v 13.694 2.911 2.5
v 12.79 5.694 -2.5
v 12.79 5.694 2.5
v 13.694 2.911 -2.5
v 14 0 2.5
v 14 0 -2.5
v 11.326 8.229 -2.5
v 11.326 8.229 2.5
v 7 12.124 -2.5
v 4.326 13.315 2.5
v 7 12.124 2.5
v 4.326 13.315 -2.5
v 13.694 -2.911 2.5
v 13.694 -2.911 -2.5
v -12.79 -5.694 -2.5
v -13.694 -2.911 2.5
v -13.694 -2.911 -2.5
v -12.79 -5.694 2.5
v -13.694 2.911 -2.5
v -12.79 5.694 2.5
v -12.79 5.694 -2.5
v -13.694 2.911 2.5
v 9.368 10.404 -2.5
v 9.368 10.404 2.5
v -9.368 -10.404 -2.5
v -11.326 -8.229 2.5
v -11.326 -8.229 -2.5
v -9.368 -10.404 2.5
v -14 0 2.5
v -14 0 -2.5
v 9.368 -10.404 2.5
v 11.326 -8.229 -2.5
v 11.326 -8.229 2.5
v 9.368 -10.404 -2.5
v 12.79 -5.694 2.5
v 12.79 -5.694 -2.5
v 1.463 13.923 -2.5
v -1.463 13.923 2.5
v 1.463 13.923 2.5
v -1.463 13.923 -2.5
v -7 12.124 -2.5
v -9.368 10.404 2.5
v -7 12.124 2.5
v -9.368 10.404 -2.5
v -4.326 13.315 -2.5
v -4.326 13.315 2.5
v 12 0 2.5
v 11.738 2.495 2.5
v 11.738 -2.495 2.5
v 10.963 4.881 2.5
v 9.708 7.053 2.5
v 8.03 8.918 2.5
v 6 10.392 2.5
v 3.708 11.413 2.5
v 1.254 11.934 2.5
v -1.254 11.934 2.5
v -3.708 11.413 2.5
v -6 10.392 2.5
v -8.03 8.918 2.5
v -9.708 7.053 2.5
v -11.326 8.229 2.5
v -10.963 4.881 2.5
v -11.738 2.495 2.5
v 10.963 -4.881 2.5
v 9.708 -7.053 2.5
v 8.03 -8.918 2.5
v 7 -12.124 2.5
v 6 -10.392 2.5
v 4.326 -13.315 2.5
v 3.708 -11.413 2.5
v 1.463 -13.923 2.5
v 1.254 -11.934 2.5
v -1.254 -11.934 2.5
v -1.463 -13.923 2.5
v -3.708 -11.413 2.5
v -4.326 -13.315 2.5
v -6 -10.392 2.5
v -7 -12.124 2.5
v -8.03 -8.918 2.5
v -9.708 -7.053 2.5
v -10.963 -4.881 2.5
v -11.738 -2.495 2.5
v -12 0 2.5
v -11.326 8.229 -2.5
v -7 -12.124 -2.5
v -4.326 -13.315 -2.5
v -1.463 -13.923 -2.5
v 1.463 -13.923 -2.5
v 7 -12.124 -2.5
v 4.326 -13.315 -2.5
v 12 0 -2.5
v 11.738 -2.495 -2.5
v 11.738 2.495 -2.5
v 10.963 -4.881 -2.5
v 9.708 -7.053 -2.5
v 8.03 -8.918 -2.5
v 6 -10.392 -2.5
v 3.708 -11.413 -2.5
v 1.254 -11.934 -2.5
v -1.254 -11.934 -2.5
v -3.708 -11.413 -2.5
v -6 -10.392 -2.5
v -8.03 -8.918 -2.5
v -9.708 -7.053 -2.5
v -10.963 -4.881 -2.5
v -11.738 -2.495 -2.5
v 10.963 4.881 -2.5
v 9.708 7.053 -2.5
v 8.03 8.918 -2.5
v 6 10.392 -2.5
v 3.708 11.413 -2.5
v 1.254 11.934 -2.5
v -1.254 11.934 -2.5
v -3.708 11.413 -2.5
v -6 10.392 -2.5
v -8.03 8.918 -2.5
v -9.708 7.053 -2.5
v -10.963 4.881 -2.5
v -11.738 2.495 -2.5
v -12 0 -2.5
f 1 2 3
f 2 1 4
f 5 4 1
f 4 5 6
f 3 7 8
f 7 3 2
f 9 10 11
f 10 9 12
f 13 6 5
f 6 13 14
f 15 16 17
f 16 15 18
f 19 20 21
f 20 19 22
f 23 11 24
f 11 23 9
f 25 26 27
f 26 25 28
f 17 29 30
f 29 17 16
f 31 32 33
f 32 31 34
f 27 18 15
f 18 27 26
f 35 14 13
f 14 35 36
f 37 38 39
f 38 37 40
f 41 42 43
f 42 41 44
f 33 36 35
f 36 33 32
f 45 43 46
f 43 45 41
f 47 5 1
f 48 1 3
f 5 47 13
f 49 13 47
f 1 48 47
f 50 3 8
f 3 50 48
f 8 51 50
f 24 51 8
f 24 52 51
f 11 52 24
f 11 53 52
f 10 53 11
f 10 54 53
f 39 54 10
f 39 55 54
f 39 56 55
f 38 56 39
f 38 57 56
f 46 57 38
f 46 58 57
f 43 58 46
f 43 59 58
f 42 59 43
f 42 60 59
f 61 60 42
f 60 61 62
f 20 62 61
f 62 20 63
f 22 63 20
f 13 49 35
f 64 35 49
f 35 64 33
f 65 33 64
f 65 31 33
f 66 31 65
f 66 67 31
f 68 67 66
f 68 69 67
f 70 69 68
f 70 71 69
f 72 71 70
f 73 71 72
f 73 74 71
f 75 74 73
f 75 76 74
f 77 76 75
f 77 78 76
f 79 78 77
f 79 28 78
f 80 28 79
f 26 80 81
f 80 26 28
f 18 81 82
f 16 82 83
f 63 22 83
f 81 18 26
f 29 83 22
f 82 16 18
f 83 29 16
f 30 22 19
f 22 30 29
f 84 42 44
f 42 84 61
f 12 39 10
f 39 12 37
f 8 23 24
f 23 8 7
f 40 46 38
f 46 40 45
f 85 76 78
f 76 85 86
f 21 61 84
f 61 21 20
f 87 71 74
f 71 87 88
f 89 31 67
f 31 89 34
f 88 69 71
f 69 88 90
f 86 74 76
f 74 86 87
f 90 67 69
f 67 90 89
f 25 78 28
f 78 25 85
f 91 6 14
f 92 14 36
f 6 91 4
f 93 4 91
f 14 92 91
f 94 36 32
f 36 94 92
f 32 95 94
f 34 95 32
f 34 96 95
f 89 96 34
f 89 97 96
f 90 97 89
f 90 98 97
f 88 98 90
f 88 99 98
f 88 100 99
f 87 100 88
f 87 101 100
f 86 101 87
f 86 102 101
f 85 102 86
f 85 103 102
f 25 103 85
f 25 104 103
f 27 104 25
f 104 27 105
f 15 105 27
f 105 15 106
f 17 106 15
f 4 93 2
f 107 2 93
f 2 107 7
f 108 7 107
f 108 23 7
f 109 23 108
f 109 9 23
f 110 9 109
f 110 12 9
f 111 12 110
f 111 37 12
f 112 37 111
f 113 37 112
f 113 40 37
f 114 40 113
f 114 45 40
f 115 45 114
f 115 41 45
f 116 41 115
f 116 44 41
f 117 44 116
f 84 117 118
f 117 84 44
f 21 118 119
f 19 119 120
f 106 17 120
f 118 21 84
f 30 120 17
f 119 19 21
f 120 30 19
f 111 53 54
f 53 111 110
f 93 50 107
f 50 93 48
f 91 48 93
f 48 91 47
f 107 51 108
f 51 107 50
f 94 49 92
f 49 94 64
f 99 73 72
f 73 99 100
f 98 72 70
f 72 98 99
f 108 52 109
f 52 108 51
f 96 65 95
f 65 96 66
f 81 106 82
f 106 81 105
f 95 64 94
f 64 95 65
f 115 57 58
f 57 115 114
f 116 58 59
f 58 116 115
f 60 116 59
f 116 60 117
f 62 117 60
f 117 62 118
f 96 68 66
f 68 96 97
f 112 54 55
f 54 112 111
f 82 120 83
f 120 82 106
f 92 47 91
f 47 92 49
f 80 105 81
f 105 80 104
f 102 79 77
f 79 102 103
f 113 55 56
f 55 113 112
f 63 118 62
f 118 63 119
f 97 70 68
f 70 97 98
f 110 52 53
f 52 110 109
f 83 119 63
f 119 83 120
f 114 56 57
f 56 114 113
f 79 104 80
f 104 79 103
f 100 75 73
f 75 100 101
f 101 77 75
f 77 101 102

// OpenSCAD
r_outer = 14;
r_inner = 12;
thickness = 5;

TOL = 0.01;


// ring
difference() {
    cylinder(h=thickness, r=r_outer, center=true);
    cylinder(h=thickness+TOL, r=r_inner, center=true);
}

// mount surface
